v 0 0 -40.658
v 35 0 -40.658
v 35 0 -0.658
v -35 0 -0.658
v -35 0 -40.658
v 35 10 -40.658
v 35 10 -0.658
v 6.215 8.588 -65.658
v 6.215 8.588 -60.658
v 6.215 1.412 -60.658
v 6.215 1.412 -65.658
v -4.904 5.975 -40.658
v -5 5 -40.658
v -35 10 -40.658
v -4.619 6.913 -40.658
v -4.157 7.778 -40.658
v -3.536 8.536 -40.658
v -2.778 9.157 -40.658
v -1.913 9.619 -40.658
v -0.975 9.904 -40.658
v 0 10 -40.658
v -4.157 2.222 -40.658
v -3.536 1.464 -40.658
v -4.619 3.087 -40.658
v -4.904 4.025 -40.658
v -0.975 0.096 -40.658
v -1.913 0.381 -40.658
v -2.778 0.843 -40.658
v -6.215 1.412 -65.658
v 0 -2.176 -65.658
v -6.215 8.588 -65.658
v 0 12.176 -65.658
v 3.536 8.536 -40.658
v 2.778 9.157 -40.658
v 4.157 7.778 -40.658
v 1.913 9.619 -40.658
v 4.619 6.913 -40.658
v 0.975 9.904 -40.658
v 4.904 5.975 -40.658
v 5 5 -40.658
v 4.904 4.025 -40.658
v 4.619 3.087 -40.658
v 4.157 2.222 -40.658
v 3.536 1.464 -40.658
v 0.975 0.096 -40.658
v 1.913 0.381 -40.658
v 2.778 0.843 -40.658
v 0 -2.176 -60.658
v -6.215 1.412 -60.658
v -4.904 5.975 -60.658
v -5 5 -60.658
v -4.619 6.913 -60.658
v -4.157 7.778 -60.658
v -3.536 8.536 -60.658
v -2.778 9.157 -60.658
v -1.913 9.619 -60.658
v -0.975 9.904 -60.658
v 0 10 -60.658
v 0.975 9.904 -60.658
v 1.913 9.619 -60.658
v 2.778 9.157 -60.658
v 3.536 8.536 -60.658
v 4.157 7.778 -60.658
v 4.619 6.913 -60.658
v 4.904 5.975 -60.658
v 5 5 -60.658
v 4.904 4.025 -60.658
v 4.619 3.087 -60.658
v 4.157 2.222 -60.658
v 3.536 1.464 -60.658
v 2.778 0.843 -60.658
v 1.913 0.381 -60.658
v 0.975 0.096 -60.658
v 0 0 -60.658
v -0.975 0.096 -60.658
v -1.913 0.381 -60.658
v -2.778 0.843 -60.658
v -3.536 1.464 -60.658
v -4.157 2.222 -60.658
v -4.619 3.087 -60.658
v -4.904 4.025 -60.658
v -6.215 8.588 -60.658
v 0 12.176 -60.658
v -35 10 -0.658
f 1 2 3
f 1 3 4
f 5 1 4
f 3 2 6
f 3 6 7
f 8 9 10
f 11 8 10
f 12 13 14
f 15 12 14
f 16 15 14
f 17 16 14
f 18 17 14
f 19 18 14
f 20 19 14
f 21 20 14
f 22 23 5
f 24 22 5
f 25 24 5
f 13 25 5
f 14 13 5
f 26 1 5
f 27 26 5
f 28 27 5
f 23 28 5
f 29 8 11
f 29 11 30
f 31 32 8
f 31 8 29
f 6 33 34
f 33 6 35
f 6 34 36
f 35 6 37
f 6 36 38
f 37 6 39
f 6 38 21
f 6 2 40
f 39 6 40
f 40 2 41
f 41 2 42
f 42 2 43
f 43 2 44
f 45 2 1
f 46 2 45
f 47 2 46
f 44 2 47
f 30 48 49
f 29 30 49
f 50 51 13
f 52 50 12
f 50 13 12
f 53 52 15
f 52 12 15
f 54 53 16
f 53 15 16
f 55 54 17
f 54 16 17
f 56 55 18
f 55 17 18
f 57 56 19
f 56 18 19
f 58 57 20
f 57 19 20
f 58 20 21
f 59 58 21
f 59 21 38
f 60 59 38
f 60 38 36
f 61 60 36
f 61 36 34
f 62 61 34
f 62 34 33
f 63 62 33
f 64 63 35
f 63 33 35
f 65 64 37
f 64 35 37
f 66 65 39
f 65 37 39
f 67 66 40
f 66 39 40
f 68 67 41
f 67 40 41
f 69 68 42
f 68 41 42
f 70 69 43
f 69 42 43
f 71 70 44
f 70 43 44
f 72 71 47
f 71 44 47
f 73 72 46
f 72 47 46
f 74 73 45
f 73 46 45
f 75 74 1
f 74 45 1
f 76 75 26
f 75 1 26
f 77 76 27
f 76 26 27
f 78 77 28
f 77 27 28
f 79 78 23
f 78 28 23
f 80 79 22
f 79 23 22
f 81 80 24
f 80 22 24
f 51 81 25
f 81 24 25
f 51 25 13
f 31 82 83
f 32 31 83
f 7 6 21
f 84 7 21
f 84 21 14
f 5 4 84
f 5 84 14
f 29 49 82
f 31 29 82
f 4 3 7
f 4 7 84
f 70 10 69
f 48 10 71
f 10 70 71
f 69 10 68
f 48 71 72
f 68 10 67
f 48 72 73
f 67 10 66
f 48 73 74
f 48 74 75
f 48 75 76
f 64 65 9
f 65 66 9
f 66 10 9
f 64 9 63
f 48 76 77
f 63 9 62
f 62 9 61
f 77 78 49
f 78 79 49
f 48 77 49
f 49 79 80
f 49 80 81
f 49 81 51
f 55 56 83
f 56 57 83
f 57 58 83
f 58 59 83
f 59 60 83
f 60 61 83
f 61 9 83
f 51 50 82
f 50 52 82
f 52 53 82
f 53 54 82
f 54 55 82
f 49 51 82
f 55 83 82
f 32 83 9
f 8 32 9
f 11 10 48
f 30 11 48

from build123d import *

# Parameters (mm, degrees)
BOSS_EXTRUDE1_DEPTH = 10
SKETCH2_R           = 5
BOSS_EXTRUDE2_DEPTH = 20
BOSS_EXTRUDE4_DEPTH = 5


with BuildPart() as part:
    # Sketch1 → Boss-Extrude1 (new body)
    with BuildSketch(Plane(origin=(0, 0, 0), x_dir=(1, 0, 0), z_dir=(0, 1, 0))):
        Polygon((-35, 40.657635654), (0, 40.657635654), (35, 40.657635654), (35, 0.657635654), (-35, 0.657635654), align=None)
    extrude(amount=BOSS_EXTRUDE1_DEPTH)

    # Sketch2 → Boss-Extrude2 (add)
    with BuildSketch(Plane(origin=(0, 0, -40.657635654), x_dir=(-1, 0, 0), z_dir=(0, 0, -1))):
        with Locations((0, 5)):
            Circle(SKETCH2_R)
    extrude(amount=BOSS_EXTRUDE2_DEPTH)

    # Sketch3 → Boss-Extrude4 (add)
    with BuildSketch(Plane(origin=(0, 0, -60.657635654), x_dir=(-1, 0, 0), z_dir=(0, 0, -1))):
        Polygon((0, -2.176119405), (6.214701705, 1.411940298), (6.214701705, 8.588059702), (0, 12.176119405), (-6.214701705, 8.588059702), (-6.214701705, 1.411940298), align=None)
    extrude(amount=BOSS_EXTRUDE4_DEPTH)


solid = part.part
